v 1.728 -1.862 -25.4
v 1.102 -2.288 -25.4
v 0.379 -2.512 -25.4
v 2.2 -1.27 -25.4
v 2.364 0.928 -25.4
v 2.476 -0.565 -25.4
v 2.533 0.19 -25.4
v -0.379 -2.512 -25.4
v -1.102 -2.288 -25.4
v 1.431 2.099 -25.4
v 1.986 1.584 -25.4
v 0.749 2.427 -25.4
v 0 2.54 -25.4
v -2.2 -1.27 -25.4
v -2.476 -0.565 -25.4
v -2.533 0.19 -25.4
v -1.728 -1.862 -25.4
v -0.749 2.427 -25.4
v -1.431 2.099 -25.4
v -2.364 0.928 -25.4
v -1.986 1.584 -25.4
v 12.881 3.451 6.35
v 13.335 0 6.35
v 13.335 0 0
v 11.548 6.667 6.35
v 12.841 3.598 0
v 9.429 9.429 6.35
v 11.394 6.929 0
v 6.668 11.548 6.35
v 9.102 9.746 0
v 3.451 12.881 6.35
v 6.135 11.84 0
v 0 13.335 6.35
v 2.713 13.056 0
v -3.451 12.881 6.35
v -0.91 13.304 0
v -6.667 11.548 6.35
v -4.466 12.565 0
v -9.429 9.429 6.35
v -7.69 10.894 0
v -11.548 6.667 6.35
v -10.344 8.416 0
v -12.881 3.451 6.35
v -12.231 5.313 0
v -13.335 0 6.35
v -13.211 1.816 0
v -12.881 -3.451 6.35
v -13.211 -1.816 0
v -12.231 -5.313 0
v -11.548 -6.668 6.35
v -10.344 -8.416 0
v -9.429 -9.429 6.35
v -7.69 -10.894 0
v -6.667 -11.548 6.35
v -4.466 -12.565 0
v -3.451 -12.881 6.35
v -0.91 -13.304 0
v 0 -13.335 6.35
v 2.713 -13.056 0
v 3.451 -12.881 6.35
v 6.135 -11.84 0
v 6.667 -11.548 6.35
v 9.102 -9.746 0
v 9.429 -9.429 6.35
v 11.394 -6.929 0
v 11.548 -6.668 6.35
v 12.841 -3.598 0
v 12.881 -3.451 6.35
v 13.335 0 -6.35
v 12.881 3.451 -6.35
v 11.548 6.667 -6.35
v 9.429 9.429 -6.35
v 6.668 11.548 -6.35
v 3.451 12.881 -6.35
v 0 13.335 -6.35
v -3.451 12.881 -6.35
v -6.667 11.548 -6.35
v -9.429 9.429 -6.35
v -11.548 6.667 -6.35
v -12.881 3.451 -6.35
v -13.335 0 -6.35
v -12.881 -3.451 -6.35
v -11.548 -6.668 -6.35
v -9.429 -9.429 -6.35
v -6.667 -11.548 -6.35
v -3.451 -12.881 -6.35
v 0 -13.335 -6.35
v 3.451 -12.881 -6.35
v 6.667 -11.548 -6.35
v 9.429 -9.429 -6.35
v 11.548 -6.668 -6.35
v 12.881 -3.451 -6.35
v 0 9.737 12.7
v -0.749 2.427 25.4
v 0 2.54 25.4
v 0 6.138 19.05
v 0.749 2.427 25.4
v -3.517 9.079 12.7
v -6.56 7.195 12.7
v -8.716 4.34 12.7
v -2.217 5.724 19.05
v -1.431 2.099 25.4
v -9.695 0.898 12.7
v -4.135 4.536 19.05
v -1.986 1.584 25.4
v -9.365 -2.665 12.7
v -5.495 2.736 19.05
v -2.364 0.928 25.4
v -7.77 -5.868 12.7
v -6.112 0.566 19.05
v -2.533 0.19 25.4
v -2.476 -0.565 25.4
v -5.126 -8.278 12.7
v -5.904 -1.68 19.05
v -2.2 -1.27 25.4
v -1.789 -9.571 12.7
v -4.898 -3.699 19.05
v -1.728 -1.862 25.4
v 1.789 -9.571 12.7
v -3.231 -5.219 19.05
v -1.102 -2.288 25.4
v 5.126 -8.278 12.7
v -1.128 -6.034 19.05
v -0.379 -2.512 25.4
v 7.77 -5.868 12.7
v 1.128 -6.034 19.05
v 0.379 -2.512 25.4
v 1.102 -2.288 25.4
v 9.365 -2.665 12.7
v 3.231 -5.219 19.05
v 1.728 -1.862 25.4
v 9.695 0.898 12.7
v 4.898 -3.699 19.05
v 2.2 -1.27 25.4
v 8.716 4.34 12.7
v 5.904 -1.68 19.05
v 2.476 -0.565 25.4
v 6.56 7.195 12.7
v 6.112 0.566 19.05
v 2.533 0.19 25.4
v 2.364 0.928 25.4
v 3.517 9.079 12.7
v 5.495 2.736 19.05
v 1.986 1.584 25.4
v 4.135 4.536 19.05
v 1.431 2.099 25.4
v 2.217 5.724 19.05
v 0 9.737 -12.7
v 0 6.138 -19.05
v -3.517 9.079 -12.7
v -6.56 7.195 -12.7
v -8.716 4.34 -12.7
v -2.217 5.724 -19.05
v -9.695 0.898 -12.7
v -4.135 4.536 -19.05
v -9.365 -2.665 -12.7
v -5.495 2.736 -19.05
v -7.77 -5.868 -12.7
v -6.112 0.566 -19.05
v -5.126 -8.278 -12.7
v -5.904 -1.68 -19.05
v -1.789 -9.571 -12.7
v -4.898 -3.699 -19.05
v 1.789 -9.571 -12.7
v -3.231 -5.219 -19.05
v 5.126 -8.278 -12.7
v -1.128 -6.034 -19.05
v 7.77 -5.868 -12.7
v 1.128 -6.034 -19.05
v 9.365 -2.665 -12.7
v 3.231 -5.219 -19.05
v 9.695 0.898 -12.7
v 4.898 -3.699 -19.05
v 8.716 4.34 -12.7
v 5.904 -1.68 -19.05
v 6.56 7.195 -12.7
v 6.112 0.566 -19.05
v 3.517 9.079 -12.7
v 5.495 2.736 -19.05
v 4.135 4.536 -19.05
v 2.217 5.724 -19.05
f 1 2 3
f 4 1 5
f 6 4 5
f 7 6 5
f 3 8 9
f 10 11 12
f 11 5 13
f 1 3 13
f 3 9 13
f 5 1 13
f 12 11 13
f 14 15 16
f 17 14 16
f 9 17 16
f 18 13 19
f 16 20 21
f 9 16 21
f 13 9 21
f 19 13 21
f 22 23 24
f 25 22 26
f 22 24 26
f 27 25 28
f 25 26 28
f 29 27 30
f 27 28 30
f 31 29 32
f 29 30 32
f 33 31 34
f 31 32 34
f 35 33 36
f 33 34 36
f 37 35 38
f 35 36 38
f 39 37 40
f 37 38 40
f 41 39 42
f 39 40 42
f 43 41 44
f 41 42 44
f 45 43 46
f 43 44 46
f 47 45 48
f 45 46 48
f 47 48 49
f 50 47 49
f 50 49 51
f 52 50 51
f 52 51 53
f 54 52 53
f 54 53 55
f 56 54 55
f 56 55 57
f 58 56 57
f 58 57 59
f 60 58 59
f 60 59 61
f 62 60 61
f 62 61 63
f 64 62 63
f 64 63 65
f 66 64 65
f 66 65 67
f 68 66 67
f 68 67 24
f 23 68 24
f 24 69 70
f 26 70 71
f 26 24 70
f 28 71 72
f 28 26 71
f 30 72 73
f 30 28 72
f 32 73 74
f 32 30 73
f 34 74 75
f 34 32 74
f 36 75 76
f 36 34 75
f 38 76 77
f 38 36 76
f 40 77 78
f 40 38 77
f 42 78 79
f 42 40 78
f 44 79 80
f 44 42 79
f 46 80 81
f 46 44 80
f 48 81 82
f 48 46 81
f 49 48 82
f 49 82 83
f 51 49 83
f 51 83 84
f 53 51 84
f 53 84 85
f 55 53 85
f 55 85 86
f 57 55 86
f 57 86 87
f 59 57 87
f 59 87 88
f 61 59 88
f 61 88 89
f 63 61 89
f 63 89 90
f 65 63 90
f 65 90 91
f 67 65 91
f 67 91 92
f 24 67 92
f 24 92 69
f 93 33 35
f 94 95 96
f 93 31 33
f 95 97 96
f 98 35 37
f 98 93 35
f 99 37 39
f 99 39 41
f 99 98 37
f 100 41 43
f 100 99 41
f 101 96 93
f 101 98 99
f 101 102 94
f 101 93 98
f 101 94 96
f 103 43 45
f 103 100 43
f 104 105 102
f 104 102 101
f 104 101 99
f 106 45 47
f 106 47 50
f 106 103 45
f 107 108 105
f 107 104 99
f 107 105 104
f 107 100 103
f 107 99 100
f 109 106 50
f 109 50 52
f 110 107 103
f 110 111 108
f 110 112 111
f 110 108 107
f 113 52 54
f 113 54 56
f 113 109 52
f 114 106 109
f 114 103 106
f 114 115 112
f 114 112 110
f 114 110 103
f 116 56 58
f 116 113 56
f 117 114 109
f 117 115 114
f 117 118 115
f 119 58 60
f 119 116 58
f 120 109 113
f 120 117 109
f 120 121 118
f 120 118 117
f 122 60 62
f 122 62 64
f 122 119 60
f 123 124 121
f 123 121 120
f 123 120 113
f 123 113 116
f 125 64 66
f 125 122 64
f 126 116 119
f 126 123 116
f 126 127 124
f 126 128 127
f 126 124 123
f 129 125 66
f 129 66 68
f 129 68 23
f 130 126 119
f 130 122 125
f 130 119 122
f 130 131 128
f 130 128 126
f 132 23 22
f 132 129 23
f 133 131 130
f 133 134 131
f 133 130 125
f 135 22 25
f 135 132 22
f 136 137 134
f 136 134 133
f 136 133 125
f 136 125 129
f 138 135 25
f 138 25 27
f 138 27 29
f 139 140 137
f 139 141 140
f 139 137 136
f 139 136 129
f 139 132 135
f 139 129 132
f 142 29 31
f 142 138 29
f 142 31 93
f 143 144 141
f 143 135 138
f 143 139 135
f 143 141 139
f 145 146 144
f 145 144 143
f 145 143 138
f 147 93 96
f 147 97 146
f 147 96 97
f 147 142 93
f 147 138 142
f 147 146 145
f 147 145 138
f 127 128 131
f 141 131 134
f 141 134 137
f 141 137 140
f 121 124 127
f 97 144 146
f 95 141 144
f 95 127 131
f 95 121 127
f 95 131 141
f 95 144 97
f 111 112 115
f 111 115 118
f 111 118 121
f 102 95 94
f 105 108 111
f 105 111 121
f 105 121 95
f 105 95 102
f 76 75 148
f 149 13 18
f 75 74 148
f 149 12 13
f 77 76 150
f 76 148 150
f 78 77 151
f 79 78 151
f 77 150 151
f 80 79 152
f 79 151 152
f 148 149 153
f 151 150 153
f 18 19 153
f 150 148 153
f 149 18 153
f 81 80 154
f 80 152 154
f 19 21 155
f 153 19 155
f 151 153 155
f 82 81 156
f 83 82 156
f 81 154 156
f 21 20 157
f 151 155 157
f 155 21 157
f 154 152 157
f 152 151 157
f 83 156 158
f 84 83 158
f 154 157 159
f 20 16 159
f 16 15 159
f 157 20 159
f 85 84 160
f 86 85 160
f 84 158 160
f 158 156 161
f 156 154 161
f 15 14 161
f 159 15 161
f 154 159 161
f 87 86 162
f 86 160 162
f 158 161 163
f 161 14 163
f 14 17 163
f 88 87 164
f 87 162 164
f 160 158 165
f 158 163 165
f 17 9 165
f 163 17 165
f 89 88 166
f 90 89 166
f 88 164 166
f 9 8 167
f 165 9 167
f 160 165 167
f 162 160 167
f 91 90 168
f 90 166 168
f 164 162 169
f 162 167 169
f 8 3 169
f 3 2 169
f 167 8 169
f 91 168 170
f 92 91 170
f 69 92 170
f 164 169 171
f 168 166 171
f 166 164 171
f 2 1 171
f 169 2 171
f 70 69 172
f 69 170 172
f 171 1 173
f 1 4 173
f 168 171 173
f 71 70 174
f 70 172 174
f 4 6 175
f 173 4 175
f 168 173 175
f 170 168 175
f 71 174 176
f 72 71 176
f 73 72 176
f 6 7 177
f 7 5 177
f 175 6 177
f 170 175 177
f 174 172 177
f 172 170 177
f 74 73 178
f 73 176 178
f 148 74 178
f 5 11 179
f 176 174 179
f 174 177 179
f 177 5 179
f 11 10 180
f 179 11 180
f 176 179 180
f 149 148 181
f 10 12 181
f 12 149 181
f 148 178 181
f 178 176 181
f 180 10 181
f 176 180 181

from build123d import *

# Parameters (mm, degrees)
F0_R     = 13.335
F1_DEPTH = 6.35


with BuildPart() as f1:
    # F0 (on Top) → F1 (new body)
    with BuildSketch(Plane.XY):
        Circle(F0_R)
    extrude(amount=F1_DEPTH)

    # F4 (on Right) → F6 (revolve)
    with BuildSketch(Plane.YZ):
        Polygon((0, 25.4), (0, 6.35), (13.335, 6.35), (2.54, 25.4), align=None)
    revolve(axis=Axis((0, 0, 24.791185), (0, 0, 1)))

    # F7: F1 across plane


with BuildPart() as f1_1:
    add(f1.part)
    add(f1.part.mirror(Plane.XY))


solid = f1_1.part
